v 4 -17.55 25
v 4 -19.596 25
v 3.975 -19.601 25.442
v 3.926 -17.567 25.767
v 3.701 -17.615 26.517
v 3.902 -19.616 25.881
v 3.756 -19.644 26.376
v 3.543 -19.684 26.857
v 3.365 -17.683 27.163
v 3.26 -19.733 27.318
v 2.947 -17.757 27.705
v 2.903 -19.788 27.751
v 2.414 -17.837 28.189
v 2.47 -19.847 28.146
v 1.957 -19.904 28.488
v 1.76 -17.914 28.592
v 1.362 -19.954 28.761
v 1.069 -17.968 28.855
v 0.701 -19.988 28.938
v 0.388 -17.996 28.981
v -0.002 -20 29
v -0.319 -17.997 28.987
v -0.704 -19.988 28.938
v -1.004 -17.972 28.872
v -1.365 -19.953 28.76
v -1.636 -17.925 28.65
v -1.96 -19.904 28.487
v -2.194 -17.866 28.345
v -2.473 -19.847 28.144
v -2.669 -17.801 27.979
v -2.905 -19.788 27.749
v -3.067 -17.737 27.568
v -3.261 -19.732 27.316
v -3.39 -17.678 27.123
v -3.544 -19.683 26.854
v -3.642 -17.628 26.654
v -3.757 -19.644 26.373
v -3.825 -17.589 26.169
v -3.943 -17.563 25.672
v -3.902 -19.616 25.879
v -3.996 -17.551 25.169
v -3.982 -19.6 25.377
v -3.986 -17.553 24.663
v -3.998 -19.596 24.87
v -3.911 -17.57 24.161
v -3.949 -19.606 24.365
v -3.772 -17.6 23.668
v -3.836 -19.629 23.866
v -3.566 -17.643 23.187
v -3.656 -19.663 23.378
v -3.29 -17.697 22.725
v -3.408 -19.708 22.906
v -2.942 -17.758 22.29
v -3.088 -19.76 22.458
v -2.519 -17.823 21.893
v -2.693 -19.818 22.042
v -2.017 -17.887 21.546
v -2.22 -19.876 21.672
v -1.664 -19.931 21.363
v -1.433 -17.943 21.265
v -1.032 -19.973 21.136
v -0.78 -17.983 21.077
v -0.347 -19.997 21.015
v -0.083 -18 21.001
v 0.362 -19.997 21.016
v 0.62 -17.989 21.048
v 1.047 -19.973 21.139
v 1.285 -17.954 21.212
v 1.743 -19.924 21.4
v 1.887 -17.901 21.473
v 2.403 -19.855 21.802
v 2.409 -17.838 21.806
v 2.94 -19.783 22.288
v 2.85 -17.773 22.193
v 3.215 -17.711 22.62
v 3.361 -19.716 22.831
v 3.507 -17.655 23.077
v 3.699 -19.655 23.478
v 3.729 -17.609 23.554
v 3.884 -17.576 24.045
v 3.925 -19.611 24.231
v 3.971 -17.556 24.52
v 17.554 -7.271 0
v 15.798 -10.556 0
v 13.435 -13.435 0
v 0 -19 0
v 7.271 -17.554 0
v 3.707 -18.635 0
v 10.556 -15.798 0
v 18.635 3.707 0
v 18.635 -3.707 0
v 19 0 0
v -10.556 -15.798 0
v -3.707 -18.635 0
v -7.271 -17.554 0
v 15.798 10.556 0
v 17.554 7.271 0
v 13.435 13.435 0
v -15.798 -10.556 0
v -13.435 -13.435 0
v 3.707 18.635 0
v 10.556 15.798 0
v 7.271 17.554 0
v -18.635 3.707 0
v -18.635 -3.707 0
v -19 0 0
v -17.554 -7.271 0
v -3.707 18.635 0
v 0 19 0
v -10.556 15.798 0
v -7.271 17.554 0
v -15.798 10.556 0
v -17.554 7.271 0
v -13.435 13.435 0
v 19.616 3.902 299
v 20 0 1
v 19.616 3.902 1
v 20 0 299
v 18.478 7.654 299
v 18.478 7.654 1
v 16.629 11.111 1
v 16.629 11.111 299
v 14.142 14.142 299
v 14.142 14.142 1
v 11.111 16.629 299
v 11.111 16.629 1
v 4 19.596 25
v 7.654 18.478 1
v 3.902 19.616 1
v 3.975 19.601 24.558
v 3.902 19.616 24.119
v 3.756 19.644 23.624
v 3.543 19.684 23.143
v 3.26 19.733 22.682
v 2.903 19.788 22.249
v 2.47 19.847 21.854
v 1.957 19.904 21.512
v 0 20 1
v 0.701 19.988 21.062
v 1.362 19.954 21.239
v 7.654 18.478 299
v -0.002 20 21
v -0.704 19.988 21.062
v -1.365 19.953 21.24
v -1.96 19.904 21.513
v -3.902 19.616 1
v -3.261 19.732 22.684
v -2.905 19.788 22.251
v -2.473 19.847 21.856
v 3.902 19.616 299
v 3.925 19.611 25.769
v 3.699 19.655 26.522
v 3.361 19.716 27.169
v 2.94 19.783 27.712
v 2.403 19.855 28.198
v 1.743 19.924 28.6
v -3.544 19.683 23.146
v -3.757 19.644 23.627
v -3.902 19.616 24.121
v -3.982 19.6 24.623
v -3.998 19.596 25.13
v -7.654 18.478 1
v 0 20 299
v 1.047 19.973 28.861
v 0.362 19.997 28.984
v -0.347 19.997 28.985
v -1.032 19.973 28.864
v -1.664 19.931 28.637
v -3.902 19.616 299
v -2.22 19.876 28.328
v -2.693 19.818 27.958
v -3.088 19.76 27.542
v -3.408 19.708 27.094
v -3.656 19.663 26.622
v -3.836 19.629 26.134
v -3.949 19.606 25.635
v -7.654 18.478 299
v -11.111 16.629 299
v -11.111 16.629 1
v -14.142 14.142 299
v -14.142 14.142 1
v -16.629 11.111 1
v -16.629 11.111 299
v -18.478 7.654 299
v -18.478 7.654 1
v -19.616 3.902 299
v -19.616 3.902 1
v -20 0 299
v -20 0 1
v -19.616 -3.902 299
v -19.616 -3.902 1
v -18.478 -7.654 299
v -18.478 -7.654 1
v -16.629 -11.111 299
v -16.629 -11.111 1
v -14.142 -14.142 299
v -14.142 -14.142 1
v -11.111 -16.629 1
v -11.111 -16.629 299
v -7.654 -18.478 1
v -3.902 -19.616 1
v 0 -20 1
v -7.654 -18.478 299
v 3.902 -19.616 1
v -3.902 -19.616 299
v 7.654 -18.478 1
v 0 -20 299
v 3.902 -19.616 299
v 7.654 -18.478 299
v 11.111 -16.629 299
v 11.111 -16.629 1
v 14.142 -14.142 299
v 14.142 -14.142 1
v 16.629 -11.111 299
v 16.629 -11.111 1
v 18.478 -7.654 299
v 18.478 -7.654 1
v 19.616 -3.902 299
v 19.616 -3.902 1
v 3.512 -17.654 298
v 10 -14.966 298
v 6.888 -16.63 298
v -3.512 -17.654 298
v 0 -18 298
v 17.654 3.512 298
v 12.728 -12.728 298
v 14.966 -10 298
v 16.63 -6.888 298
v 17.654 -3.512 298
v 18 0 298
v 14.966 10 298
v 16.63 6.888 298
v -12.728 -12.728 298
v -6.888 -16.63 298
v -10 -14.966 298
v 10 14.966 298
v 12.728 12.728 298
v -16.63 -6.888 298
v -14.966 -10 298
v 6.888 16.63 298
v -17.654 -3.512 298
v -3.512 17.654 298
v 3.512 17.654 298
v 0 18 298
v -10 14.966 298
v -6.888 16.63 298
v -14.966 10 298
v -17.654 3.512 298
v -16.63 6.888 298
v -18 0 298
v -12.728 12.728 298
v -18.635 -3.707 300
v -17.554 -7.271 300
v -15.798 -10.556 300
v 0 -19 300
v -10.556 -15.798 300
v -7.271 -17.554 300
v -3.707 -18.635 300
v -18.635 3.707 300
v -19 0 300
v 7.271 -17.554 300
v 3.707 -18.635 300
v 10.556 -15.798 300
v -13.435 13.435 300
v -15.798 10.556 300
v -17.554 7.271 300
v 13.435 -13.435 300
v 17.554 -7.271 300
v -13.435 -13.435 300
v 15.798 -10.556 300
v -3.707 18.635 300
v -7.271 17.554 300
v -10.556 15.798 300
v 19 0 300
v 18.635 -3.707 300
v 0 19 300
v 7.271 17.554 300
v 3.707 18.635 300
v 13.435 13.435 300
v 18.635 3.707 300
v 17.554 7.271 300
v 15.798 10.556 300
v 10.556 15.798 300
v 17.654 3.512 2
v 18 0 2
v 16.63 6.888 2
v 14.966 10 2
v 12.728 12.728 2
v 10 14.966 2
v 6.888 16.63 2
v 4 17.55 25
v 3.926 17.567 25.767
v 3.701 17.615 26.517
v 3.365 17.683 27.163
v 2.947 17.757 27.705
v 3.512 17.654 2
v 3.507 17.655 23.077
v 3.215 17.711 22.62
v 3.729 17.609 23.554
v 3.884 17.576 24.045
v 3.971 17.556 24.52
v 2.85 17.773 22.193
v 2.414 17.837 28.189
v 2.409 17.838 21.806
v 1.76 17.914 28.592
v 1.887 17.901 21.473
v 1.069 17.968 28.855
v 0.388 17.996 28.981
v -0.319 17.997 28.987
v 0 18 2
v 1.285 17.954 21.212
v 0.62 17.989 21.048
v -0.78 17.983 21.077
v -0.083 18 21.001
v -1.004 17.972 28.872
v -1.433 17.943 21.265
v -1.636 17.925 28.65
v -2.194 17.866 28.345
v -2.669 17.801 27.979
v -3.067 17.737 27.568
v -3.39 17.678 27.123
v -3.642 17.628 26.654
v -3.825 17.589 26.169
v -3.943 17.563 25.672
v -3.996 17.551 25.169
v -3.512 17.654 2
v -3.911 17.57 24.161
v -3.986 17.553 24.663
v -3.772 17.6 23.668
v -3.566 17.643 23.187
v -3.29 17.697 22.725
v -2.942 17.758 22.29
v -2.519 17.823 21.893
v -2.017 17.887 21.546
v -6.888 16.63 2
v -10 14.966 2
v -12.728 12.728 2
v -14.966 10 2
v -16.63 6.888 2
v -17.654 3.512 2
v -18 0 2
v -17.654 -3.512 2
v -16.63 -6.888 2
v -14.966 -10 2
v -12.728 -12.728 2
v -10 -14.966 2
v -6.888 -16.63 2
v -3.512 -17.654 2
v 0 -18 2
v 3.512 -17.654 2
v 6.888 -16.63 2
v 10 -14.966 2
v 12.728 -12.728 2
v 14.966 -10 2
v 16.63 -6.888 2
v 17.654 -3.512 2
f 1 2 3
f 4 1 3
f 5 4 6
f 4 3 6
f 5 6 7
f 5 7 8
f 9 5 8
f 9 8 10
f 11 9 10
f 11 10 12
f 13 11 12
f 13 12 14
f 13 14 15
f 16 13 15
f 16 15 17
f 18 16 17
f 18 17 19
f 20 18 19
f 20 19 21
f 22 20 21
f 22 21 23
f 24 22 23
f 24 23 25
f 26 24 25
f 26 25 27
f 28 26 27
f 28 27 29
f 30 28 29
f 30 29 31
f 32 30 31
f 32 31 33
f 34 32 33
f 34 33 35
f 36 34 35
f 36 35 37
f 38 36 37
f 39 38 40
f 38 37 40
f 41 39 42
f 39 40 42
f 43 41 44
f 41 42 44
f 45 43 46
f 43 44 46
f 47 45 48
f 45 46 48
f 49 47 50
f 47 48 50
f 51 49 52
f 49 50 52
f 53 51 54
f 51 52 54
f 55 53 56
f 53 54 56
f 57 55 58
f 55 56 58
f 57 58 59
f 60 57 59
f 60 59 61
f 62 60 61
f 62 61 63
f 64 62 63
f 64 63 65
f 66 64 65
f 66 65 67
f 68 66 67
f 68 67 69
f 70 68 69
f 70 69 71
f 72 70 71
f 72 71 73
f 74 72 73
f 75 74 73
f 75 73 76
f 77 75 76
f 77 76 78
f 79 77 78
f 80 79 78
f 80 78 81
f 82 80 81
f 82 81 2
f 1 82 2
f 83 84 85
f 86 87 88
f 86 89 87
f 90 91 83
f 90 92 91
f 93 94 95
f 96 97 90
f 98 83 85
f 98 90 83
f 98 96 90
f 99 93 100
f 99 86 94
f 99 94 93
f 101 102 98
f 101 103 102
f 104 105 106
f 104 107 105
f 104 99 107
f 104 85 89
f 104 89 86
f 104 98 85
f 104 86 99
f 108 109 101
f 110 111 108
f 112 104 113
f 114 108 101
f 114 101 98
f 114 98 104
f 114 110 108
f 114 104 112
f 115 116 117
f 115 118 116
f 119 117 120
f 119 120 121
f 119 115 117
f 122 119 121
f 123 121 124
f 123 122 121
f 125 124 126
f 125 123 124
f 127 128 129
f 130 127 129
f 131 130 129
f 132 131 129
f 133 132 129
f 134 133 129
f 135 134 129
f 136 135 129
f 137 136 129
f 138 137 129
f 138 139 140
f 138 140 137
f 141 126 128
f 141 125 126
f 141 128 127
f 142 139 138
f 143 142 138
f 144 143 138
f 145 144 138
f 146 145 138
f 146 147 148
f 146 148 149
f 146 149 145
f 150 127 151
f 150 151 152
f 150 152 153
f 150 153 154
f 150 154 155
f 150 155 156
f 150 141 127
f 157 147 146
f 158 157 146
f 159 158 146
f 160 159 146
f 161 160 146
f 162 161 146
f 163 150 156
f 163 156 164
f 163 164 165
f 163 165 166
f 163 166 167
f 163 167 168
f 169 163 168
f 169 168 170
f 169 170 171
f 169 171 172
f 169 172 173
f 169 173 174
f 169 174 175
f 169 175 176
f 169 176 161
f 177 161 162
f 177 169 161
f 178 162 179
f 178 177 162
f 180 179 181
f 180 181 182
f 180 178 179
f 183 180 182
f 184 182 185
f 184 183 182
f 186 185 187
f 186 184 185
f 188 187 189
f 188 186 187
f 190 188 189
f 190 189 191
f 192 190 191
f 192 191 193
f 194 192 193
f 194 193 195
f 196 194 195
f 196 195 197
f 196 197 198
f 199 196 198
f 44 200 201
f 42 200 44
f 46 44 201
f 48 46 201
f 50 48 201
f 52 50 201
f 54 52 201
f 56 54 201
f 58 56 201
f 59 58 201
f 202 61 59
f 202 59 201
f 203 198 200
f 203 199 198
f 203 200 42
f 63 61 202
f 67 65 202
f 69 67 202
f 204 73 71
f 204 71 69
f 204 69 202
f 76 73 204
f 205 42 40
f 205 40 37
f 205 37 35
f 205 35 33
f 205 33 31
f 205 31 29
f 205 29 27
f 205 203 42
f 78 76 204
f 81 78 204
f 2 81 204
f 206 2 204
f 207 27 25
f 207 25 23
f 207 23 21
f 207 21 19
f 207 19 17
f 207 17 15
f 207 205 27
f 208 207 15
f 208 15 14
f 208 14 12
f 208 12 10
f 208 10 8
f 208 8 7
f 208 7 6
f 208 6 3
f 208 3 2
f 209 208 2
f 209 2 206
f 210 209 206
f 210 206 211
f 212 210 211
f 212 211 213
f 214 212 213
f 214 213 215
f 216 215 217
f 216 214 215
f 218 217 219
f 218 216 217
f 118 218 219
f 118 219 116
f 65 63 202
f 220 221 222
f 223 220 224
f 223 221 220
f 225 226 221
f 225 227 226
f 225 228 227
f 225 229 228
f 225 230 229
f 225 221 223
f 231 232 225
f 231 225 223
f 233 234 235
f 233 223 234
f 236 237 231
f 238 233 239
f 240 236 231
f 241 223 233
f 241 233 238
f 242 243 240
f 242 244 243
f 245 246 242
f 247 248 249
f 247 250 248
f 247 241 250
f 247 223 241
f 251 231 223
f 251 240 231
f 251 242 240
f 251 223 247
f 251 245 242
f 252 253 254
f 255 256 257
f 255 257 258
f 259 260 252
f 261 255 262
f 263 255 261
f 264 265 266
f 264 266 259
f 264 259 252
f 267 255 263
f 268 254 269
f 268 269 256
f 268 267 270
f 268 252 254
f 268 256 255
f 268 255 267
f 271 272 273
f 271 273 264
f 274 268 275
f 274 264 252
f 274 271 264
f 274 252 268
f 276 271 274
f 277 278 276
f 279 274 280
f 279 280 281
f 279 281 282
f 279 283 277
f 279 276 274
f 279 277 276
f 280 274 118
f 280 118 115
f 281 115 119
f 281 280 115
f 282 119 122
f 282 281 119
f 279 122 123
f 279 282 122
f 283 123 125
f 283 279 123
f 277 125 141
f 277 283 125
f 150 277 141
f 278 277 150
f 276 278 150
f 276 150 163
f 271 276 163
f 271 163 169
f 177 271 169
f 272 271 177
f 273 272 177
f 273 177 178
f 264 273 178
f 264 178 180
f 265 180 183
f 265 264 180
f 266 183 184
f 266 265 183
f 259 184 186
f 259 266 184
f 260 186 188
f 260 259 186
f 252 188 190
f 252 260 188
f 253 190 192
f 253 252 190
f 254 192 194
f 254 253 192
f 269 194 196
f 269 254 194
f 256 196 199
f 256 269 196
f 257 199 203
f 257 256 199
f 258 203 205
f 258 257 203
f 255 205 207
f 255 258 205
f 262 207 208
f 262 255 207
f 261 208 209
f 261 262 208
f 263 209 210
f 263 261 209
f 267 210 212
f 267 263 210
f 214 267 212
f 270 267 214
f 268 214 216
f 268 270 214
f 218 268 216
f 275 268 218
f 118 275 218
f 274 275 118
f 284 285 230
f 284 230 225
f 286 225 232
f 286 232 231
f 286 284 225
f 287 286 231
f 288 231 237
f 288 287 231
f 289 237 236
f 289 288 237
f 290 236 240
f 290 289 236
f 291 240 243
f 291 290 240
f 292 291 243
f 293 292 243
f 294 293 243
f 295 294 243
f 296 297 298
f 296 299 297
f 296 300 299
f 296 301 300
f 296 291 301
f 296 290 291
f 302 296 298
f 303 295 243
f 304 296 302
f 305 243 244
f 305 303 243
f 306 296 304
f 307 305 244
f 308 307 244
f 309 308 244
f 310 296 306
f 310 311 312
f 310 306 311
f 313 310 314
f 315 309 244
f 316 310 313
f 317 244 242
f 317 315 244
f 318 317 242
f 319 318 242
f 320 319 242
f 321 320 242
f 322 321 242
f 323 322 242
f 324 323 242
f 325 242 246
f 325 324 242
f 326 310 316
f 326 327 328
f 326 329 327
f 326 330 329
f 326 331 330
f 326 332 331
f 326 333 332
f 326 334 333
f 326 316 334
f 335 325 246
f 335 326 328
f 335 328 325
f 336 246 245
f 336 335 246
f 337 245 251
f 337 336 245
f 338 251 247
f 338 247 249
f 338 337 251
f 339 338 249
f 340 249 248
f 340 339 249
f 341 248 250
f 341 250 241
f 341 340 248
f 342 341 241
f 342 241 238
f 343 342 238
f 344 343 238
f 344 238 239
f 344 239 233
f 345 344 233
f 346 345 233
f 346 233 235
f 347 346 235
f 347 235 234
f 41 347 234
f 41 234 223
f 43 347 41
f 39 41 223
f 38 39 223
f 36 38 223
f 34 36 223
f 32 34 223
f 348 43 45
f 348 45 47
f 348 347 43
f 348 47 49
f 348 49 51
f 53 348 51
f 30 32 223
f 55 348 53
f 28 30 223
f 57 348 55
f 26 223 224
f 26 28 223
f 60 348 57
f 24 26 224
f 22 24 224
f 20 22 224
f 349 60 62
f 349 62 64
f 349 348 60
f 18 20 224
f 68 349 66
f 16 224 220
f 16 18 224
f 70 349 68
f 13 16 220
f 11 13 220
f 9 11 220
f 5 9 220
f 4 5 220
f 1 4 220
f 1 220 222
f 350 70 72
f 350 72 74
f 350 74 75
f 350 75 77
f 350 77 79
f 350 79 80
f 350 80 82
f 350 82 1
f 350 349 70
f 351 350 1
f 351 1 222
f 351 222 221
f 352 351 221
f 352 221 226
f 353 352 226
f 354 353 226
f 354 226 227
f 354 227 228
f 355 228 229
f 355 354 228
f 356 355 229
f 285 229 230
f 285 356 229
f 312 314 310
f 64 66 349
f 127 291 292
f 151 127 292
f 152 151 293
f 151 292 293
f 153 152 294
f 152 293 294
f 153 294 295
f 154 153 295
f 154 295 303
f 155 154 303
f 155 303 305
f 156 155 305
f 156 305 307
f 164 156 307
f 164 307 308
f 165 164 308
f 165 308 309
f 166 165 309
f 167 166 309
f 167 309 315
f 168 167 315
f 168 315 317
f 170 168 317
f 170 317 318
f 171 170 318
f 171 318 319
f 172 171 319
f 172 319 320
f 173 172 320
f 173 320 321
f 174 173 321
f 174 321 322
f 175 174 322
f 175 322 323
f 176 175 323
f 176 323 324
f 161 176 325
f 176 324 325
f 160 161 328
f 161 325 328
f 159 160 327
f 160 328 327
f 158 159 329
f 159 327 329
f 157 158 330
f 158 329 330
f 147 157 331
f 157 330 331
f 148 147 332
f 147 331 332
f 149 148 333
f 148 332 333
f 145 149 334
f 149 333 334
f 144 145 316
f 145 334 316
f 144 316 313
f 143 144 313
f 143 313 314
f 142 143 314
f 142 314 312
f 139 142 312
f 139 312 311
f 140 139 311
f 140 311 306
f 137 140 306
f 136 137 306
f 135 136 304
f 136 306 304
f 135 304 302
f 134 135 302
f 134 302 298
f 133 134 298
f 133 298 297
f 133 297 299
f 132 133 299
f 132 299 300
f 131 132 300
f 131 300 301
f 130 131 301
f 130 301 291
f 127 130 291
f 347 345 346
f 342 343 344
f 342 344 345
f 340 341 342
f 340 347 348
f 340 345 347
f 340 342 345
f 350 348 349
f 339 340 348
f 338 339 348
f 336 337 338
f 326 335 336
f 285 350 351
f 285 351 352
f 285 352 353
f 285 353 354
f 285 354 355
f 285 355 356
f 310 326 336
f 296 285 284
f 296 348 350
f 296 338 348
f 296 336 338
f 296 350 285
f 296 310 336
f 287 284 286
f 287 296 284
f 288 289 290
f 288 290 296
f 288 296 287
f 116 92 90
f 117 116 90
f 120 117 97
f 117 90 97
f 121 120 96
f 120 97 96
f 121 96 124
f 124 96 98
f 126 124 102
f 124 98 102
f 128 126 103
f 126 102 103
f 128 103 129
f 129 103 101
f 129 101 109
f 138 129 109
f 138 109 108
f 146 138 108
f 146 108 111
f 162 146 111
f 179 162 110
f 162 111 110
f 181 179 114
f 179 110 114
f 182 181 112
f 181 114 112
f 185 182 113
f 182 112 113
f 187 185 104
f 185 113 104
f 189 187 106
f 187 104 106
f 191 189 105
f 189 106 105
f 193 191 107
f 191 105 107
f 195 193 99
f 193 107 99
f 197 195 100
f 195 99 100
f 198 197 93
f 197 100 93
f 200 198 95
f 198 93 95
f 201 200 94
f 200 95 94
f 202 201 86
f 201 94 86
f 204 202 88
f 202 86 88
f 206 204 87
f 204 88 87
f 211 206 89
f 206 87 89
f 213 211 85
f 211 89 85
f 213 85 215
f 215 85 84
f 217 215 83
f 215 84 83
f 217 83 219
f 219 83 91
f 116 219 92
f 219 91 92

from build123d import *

# Parameters (mm, degrees)
F3_SIZE  = 1
F4_SIZE  = 1
F6_R     = 4
F7_DEPTH = 40


with BuildPart() as f2:
    # F0 (on Front) → F2 (revolve)
    with BuildSketch(Plane.XZ):
        Polygon((0, 2), (0, 0), (20, 0), (20, 300), (0, 300), (0, 298), (18, 298), (18, 2), align=None)
    revolve(axis=Axis((0, 0, 152.335405), (0, 0, 1)))

    # F3
    f3_edges = [f2.edges().sort_by_distance(p)[0] for p in [
        (-20, 0, 300),
    ]]
    chamfer(f3_edges, length=F3_SIZE)

    # F4
    f4_edges = [f2.edges().sort_by_distance(p)[0] for p in [
        (-20, 0, 0),
    ]]
    chamfer(f4_edges, length=F4_SIZE)

    # F6 (on offset) → F7 (cut)
    with BuildSketch(Plane.XZ.offset(20)):
        with Locations((0, 25)):
            Circle(F6_R)
    extrude(amount=-F7_DEPTH, mode=Mode.SUBTRACT)


solid = f2.part
